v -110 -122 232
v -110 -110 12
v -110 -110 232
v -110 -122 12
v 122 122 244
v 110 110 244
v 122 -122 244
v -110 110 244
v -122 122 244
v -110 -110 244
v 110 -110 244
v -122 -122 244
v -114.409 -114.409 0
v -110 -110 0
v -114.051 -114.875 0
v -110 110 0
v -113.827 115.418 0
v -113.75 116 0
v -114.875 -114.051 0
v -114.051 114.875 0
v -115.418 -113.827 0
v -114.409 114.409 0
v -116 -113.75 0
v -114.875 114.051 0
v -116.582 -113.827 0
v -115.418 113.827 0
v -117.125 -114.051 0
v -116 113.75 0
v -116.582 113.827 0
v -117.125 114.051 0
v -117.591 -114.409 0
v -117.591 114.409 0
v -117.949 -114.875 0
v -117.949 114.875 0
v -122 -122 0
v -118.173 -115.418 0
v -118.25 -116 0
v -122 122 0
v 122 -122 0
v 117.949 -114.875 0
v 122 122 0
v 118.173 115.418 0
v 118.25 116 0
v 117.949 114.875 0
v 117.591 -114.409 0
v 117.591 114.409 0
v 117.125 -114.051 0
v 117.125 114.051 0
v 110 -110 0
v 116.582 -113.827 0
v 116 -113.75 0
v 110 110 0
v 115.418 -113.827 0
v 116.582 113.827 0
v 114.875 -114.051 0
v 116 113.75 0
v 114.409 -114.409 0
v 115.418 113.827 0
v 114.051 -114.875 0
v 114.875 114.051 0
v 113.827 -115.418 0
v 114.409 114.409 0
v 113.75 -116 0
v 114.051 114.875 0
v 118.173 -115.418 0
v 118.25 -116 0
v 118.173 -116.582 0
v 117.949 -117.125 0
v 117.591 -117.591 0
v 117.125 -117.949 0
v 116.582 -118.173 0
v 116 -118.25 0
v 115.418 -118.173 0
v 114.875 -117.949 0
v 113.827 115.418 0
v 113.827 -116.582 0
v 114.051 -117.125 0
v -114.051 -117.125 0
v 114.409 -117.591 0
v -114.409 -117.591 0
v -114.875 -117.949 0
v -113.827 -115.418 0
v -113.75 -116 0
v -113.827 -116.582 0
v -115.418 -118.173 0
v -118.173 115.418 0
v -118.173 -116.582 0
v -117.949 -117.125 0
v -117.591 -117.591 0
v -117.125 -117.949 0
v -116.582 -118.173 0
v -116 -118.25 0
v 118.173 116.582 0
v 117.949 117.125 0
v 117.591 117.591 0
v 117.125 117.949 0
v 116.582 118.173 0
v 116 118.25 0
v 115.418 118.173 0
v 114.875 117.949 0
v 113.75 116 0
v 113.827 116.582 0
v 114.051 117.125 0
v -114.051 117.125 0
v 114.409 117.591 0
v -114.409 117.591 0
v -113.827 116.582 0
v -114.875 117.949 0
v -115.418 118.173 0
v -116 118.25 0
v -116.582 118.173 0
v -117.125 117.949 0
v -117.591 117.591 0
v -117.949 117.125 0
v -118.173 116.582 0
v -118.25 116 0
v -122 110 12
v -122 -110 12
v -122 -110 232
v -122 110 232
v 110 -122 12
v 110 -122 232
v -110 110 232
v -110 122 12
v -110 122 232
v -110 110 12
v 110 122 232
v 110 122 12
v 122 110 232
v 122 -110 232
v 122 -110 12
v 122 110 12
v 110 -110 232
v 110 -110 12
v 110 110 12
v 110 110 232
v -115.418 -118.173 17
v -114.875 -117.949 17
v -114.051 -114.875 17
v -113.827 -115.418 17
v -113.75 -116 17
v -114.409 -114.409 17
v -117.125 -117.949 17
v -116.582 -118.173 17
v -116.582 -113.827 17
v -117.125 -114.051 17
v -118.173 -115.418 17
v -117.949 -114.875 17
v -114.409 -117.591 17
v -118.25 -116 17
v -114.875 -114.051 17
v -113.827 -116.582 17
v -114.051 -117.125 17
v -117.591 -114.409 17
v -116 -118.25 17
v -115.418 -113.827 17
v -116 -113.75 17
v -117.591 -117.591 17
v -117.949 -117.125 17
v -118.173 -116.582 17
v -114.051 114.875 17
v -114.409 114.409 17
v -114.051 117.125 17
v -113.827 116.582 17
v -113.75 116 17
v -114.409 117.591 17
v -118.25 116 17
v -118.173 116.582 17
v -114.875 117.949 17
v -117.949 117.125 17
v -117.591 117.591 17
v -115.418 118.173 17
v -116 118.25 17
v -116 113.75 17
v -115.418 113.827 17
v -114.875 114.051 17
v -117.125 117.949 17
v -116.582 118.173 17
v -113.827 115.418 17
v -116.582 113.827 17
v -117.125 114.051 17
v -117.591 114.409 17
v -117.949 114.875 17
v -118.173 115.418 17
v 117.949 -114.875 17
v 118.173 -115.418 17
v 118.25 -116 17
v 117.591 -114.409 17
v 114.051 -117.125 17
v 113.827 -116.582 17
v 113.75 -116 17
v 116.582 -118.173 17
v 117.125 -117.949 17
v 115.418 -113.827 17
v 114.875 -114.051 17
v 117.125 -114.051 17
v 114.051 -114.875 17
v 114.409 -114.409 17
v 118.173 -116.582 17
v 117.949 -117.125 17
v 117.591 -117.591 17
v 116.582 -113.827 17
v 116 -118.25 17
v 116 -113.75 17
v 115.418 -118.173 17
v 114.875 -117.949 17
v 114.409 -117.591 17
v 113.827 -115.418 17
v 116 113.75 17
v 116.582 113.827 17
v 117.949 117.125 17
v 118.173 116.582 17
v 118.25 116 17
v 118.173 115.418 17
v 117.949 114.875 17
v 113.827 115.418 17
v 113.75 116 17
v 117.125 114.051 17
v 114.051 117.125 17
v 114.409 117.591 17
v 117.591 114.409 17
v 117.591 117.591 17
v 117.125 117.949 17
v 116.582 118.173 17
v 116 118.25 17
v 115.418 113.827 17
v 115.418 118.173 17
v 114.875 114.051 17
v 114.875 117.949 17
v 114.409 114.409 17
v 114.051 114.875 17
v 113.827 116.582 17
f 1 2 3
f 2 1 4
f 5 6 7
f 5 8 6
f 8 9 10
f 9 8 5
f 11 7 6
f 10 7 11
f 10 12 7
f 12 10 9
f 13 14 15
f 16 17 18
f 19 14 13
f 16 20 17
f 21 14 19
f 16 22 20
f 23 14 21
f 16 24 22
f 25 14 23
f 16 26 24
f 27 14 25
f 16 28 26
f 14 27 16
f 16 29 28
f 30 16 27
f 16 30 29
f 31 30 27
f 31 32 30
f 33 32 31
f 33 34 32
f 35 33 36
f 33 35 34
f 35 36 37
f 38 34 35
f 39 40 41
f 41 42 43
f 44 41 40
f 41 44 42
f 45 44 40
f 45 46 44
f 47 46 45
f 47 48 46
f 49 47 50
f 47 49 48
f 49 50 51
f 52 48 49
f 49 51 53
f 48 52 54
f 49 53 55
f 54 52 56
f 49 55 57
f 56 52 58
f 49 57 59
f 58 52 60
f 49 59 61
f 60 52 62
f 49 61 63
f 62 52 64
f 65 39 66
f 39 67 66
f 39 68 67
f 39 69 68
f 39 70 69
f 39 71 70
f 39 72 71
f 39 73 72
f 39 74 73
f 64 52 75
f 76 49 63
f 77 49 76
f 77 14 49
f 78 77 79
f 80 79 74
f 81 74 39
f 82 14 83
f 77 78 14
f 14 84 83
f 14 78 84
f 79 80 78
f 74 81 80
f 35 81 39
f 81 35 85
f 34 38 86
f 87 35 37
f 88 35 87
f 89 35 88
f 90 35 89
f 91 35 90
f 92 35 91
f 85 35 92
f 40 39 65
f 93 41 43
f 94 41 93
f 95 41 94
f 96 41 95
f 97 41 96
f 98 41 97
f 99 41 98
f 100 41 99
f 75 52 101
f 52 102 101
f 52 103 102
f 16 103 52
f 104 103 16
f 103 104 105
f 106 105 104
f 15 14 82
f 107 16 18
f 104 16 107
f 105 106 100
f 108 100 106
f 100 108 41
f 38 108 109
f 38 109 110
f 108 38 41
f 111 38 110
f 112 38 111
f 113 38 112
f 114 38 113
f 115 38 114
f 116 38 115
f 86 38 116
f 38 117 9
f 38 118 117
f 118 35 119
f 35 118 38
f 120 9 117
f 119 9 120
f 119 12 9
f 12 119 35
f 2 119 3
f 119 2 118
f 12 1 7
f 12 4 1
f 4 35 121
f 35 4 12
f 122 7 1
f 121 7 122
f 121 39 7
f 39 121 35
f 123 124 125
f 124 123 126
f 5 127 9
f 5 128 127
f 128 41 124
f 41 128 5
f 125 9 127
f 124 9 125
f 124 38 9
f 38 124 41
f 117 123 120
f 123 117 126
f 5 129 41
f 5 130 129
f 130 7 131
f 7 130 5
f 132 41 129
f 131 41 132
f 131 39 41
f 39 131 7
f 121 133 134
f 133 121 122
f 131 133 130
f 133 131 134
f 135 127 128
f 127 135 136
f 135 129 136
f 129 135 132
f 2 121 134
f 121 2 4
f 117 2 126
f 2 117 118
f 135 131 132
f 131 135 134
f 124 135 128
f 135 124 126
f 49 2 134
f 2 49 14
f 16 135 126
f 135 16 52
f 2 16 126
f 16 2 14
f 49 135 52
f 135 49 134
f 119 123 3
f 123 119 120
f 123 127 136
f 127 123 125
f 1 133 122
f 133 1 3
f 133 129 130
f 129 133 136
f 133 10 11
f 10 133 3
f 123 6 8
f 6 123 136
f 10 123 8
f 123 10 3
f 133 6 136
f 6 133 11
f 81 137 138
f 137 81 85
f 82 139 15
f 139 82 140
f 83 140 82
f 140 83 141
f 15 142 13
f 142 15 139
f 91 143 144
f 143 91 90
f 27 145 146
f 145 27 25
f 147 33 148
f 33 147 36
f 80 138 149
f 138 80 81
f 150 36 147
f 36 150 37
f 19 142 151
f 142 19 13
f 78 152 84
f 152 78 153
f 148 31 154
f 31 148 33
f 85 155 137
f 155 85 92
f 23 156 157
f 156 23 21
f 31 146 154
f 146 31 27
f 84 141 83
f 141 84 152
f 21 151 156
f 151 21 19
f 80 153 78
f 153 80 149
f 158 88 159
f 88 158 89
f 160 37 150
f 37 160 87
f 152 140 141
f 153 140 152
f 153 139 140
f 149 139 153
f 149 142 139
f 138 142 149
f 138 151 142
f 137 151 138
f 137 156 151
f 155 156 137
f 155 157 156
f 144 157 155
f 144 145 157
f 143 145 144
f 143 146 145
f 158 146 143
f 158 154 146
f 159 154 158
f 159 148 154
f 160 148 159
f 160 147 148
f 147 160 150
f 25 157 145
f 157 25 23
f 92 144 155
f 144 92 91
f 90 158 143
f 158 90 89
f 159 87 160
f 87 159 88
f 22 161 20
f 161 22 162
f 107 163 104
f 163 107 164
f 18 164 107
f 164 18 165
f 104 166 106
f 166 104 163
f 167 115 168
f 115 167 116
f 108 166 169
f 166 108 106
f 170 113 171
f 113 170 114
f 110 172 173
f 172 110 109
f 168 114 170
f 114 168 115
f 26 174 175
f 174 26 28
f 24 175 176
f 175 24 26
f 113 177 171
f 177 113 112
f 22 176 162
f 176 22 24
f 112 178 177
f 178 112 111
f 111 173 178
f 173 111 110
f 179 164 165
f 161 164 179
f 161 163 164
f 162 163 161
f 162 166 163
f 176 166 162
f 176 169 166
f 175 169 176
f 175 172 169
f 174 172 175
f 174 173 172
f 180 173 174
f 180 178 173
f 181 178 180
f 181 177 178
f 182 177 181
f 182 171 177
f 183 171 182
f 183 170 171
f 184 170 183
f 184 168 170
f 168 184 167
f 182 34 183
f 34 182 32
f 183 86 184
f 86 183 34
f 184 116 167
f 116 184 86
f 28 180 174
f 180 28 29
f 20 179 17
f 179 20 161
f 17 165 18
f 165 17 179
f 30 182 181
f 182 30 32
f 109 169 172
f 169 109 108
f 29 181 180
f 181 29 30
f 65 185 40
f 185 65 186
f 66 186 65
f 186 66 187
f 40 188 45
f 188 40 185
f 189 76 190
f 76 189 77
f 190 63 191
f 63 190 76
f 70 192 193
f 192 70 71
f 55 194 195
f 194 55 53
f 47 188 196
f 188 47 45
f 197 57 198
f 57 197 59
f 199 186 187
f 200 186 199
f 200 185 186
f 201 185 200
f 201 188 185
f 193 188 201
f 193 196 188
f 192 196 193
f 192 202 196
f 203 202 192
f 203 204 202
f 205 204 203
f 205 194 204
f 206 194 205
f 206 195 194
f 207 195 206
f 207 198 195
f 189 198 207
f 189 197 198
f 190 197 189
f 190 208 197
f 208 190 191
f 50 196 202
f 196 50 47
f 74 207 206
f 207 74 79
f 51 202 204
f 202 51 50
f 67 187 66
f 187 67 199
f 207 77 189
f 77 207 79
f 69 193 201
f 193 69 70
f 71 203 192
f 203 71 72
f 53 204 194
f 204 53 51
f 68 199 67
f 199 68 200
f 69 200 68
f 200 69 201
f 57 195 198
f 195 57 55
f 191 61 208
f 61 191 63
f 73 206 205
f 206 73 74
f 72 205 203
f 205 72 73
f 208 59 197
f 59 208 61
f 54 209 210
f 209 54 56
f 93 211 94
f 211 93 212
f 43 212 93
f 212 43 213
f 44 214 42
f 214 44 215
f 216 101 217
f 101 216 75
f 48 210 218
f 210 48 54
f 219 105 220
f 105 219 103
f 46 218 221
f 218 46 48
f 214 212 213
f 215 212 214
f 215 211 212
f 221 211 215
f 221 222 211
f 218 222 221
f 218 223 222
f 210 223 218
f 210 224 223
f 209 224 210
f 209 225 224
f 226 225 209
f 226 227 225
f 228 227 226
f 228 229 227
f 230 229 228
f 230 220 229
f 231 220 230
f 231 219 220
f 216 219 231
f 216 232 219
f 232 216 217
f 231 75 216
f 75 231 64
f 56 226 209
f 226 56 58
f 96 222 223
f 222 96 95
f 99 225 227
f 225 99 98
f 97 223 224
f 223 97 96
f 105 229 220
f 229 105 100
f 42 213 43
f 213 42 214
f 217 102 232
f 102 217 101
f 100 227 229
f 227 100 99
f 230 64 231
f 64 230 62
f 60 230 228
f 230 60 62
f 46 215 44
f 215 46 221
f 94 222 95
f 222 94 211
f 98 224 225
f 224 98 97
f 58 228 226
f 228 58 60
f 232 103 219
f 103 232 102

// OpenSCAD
outer=244; bar=12; chimney_height=244; base_thickness=4; mount_hole_diameter=4.5;
module dive_chimney(){ difference(){ union(){
 translate([-outer/2,-outer/2,0]) cube([outer,bar,base_thickness]); translate([-outer/2,outer/2-bar,0]) cube([outer,bar,base_thickness]);
 for(x=[-outer/2,outer/2-bar],y=[-outer/2,outer/2-bar]) translate([x,y,0]) cube([bar,bar,chimney_height]);
 for(z=[0,chimney_height-bar]) { translate([-outer/2,-outer/2,z]) cube([outer,bar,bar]); translate([-outer/2,outer/2-bar,z]) cube([outer,bar,bar]); translate([-outer/2,-outer/2,z]) cube([bar,outer,bar]); translate([outer/2-bar,-outer/2,z]) cube([bar,outer,bar]); }
 } for(x=[-outer/2+6,outer/2-6],y=[-outer/2+6,outer/2-6]) translate([x,y,-1]) cylinder(d=mount_hole_diameter,h=18,$fn=24); }}
assert(outer-2*bar>=200 && chimney_height==244); echo("SCADCTL_REQUIREMENT:parameters:PASS"); dive_chimney();
